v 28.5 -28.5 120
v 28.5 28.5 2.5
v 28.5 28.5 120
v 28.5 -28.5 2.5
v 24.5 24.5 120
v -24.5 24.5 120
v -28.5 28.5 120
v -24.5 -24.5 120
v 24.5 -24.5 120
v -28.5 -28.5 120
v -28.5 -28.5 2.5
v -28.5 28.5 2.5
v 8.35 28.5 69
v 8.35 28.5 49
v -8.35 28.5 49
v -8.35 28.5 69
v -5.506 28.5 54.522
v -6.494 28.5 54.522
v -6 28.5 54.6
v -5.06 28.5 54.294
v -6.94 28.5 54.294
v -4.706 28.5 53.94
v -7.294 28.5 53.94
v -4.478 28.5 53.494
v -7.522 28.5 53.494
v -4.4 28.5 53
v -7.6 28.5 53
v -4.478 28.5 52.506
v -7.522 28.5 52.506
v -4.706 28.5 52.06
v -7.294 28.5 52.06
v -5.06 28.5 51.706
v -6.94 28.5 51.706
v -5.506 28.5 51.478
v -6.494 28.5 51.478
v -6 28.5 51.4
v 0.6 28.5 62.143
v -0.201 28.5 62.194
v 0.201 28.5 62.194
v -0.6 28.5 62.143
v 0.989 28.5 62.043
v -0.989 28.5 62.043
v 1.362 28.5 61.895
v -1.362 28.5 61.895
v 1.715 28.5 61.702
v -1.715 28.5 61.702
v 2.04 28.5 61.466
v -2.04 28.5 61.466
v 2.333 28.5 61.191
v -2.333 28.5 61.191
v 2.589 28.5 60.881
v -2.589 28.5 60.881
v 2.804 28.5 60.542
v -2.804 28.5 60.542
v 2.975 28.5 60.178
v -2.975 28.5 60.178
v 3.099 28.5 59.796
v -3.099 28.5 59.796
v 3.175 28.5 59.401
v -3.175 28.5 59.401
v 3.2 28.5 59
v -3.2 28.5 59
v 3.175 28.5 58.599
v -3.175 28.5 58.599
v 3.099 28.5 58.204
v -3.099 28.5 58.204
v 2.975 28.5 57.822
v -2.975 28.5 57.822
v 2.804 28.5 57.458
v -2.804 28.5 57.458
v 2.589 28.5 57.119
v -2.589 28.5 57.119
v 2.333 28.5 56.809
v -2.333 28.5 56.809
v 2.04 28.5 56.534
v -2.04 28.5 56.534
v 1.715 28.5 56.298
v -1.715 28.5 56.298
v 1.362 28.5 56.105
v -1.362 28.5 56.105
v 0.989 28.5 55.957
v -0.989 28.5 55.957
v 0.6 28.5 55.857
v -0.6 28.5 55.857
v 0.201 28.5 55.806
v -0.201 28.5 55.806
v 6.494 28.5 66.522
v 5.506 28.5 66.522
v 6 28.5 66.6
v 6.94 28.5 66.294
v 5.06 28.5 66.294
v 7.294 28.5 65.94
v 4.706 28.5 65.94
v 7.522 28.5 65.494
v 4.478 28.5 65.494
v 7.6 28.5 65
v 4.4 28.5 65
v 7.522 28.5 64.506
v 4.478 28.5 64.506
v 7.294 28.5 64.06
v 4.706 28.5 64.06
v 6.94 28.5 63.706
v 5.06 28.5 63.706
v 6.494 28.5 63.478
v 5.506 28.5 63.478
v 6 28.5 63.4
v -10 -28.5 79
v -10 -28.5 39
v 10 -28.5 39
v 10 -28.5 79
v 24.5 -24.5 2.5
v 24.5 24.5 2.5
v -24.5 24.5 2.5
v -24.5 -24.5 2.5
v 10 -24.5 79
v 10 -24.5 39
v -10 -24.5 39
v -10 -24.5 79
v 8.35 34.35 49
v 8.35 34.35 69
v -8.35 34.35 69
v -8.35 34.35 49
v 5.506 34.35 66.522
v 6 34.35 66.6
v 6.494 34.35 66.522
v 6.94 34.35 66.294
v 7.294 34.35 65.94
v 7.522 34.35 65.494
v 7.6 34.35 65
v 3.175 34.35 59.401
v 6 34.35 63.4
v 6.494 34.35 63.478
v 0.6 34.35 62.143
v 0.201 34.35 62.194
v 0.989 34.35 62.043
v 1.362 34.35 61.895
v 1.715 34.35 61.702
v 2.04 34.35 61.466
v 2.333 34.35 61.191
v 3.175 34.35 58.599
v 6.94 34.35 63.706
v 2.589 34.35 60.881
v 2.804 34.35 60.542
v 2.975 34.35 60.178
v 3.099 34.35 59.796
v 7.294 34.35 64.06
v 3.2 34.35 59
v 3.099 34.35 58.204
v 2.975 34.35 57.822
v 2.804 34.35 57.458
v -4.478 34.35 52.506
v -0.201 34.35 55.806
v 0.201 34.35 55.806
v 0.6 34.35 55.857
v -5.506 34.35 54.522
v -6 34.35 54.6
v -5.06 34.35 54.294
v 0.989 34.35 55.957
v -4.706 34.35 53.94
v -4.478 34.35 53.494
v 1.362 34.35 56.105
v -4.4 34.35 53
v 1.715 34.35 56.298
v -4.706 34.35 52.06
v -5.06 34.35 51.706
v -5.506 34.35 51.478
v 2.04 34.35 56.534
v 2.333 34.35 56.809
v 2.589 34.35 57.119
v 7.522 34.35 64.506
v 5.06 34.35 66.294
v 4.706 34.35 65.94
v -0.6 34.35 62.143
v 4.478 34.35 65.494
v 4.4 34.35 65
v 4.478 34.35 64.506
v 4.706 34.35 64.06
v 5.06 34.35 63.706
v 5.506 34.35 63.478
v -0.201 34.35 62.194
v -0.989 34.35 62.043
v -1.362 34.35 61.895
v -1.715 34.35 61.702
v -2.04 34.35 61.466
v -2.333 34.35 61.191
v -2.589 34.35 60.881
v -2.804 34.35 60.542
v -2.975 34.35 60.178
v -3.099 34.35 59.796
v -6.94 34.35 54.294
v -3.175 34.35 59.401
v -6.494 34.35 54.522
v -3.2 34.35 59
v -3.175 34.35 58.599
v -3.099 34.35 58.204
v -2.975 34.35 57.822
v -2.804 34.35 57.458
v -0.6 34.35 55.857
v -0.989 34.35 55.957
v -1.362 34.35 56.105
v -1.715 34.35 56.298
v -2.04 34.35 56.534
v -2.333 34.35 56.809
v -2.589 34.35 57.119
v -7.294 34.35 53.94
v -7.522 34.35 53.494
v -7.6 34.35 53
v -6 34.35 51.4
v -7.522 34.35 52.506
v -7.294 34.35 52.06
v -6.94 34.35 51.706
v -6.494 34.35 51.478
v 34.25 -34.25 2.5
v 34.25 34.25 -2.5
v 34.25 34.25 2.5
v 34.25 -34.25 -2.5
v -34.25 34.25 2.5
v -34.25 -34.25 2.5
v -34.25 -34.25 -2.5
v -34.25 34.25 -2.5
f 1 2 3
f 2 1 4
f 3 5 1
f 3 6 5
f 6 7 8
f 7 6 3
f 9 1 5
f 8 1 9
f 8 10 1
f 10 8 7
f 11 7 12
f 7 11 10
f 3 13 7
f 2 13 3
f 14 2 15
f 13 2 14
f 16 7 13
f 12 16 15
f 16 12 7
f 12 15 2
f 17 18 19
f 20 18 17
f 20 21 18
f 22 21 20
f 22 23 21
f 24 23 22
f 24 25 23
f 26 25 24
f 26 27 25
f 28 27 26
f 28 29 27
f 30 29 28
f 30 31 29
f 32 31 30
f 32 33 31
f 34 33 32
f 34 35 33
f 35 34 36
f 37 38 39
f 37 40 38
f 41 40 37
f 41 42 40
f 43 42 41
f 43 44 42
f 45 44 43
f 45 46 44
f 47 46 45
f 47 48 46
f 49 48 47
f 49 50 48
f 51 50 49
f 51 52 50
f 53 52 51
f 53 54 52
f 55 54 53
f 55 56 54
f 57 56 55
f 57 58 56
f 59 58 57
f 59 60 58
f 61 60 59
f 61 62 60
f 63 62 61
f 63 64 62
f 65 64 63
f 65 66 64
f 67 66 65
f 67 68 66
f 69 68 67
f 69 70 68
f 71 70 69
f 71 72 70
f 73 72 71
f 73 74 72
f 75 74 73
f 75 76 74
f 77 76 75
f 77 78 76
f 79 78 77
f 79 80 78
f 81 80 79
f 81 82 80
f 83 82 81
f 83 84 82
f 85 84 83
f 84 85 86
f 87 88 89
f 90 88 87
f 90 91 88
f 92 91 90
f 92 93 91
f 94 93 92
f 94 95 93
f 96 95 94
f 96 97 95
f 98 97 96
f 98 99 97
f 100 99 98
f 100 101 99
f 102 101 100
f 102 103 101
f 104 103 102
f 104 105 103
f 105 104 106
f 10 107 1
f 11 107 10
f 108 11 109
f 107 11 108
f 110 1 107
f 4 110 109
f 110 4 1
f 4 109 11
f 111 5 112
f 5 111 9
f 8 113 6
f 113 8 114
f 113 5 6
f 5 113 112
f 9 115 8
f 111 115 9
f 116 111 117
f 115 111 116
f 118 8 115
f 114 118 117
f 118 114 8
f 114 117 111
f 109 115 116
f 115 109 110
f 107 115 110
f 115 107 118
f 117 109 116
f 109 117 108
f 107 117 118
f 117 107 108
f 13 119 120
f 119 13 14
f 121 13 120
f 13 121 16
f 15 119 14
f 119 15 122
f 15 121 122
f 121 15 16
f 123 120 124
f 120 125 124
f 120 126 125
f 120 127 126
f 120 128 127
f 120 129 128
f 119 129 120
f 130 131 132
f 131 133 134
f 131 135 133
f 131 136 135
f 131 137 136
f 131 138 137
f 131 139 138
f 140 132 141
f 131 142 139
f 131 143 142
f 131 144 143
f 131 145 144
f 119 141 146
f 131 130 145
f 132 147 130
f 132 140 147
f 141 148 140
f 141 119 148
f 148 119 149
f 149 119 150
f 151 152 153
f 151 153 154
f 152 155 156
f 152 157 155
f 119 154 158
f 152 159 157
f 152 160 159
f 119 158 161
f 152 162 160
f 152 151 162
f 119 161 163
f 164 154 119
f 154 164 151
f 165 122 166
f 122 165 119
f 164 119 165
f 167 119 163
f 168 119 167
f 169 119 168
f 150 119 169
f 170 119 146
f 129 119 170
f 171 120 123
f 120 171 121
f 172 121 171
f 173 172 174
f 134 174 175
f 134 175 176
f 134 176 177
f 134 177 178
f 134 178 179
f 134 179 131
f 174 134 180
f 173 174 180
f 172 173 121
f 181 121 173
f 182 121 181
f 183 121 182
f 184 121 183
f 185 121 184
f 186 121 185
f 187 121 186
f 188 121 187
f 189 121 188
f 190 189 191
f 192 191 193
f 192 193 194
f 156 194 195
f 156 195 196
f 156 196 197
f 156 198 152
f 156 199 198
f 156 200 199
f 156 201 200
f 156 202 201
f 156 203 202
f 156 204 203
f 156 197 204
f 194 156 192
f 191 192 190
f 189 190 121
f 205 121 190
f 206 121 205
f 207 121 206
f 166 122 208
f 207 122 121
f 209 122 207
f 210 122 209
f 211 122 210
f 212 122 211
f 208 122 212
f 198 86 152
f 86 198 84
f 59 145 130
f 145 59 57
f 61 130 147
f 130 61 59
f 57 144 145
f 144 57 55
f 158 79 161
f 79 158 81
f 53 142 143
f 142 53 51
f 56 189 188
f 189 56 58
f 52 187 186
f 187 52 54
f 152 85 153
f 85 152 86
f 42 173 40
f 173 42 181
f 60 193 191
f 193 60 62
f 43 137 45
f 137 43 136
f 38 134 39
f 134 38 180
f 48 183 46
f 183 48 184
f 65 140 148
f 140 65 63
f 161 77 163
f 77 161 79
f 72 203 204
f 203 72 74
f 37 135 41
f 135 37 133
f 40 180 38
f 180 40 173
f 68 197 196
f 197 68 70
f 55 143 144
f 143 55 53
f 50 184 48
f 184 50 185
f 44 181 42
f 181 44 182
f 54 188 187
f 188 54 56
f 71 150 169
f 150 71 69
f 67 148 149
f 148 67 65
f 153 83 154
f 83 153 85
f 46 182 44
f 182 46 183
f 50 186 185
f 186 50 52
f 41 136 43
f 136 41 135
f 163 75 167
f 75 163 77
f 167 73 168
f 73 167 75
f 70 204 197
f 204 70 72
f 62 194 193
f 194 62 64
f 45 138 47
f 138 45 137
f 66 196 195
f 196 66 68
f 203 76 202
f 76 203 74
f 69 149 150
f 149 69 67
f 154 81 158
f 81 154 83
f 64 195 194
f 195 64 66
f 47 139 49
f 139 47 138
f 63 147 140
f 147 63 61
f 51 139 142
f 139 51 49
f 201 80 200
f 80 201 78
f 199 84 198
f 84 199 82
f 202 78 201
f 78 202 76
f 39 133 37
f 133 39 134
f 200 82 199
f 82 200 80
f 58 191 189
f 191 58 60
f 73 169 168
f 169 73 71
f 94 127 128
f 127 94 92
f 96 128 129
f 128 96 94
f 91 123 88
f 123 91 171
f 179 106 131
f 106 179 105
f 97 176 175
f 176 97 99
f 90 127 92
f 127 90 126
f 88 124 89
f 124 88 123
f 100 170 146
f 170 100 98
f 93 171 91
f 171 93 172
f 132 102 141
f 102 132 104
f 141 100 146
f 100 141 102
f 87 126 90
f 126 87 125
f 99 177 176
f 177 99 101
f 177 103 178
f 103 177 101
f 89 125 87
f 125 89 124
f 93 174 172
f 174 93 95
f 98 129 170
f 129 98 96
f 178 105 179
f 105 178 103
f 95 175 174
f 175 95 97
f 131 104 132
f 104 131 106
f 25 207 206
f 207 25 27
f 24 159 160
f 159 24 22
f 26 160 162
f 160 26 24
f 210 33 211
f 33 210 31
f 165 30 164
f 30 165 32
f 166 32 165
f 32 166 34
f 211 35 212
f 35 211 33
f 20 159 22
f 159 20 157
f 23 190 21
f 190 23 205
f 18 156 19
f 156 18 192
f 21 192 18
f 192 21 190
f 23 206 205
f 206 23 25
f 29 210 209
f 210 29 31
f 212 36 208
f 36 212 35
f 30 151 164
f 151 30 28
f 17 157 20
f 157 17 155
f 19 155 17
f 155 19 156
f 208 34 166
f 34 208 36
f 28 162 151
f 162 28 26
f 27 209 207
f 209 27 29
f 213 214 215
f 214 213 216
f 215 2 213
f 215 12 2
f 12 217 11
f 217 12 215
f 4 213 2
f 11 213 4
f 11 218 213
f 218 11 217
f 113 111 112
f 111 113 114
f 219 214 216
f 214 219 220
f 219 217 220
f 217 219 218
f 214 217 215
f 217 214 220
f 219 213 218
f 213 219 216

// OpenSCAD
/*
    VNA RFID Fixture Jig - Monolithic Design
    Role: Technical Co-Founder / Senior RF Engineer
    Project: Milk Urea AI Detection
    
    This Jig ensures a strict 3.0mm air gap between the SMA probe 
    and the PET bottle wall, with the probe centered at 59mm height.
*/

// --- PARAMETRIC CONSTANTS ---
BOTTLE_WIDTH = 48.5;    // [mm] Measured width of 200ml square PET bottle
BOTTLE_HEIGHT = 120;     // [mm] Total height of bottle slot
WALL_THICKNESS = 4.0;    // [mm] Rigidity of the 3D printed fixture
AIR_GAP = 3.0;           // [mm] MANDATORY clearance for near-field interaction
PROBE_HEIGHT = 59.0;     // [mm] Center of SMA probe from bottle base
SMA_HOLE_DIA = 6.4;      // [mm] Standard SMA connector thread diameter
SMA_FLANGE_W = 12.7;     // [mm] Standard 4-hole SMA flange width
TOLERANCE = 0.5;         // [mm] Fitting tolerance for bottle insertion

// --- MAIN ASSEMBLY ---
union() {
    base_plate();
    bottle_well();
    probe_mount_tower();
}

// --- MODULES ---

module base_plate() {
    // Solid foundation to prevent tipping during VNA sweep
    translate([0, 0, 0])
    cube([BOTTLE_WIDTH + 20, BOTTLE_WIDTH + 20, 5], center=true);
}

module bottle_well() {
    // The "monolithic" holder for the square PET bottle
    difference() {
        // External shell
        translate([0, 0, BOTTLE_HEIGHT/2])
        cube([BOTTLE_WIDTH + 2*WALL_THICKNESS + TOLERANCE, 
              BOTTLE_WIDTH + 2*WALL_THICKNESS + TOLERANCE, 
              BOTTLE_HEIGHT], center=true);
        
        // Internal hollow for bottle
        translate([0, 0, BOTTLE_HEIGHT/2 + 2]) // 2mm offset for floor
        cube([BOTTLE_WIDTH + TOLERANCE, 
              BOTTLE_WIDTH + TOLERANCE, 
              BOTTLE_HEIGHT + 1], center=true);
              
        // Front Viewing Window (Calibration check for 10mm tag)
        translate([0, -(BOTTLE_WIDTH/2 + WALL_THICKNESS), PROBE_HEIGHT])
        cube([20, 10, 40], center=true);
    }
}

module probe_mount_tower() {
    // The critical RF geometry block
    translate([0, (BOTTLE_WIDTH/2 + WALL_THICKNESS/2 + TOLERANCE/2), PROBE_HEIGHT]) {
        difference() {
            // Mounting block extending outwards
            translate([0, SMA_FLANGE_W/4, 0])
            cube([SMA_FLANGE_W + 4, SMA_FLANGE_W/2 + AIR_GAP, 20], center=true);
            
            // 1. Air Gap Cutout (Ensures SMA flange is precisely 3mm from PET wall)
            translate([0, -(SMA_FLANGE_W/4 + 1), 0])
            cube([BOTTLE_WIDTH, AIR_GAP, 50], center=true);
            
            // 2. SMA Connector Hole
            rotate([90, 0, 0])
            cylinder(h=50, d=SMA_HOLE_DIA, $fn=50, center=true);
            
            // 3. Optional: SMA Flange Bolt Holes (Assuming 2-hole diagonal)
            translate([6, 0, 6]) rotate([90, 0, 0]) cylinder(h=50, d=3.2, $fn=20, center=true);
            translate([-6, 0, -6]) rotate([90, 0, 0]) cylinder(h=50, d=3.2, $fn=20, center=true);
        }
    }
}

// --- USAGE NOTES ---
// 1. Print in PETG or PLA with 30%+ infill for dimensional stability.
// 2. Ensure Probe Height (59mm) and Air Gap (3.0mm) are verified after print.
// 3. Bottle should slide in with minimal friction (Drop and Swap).
